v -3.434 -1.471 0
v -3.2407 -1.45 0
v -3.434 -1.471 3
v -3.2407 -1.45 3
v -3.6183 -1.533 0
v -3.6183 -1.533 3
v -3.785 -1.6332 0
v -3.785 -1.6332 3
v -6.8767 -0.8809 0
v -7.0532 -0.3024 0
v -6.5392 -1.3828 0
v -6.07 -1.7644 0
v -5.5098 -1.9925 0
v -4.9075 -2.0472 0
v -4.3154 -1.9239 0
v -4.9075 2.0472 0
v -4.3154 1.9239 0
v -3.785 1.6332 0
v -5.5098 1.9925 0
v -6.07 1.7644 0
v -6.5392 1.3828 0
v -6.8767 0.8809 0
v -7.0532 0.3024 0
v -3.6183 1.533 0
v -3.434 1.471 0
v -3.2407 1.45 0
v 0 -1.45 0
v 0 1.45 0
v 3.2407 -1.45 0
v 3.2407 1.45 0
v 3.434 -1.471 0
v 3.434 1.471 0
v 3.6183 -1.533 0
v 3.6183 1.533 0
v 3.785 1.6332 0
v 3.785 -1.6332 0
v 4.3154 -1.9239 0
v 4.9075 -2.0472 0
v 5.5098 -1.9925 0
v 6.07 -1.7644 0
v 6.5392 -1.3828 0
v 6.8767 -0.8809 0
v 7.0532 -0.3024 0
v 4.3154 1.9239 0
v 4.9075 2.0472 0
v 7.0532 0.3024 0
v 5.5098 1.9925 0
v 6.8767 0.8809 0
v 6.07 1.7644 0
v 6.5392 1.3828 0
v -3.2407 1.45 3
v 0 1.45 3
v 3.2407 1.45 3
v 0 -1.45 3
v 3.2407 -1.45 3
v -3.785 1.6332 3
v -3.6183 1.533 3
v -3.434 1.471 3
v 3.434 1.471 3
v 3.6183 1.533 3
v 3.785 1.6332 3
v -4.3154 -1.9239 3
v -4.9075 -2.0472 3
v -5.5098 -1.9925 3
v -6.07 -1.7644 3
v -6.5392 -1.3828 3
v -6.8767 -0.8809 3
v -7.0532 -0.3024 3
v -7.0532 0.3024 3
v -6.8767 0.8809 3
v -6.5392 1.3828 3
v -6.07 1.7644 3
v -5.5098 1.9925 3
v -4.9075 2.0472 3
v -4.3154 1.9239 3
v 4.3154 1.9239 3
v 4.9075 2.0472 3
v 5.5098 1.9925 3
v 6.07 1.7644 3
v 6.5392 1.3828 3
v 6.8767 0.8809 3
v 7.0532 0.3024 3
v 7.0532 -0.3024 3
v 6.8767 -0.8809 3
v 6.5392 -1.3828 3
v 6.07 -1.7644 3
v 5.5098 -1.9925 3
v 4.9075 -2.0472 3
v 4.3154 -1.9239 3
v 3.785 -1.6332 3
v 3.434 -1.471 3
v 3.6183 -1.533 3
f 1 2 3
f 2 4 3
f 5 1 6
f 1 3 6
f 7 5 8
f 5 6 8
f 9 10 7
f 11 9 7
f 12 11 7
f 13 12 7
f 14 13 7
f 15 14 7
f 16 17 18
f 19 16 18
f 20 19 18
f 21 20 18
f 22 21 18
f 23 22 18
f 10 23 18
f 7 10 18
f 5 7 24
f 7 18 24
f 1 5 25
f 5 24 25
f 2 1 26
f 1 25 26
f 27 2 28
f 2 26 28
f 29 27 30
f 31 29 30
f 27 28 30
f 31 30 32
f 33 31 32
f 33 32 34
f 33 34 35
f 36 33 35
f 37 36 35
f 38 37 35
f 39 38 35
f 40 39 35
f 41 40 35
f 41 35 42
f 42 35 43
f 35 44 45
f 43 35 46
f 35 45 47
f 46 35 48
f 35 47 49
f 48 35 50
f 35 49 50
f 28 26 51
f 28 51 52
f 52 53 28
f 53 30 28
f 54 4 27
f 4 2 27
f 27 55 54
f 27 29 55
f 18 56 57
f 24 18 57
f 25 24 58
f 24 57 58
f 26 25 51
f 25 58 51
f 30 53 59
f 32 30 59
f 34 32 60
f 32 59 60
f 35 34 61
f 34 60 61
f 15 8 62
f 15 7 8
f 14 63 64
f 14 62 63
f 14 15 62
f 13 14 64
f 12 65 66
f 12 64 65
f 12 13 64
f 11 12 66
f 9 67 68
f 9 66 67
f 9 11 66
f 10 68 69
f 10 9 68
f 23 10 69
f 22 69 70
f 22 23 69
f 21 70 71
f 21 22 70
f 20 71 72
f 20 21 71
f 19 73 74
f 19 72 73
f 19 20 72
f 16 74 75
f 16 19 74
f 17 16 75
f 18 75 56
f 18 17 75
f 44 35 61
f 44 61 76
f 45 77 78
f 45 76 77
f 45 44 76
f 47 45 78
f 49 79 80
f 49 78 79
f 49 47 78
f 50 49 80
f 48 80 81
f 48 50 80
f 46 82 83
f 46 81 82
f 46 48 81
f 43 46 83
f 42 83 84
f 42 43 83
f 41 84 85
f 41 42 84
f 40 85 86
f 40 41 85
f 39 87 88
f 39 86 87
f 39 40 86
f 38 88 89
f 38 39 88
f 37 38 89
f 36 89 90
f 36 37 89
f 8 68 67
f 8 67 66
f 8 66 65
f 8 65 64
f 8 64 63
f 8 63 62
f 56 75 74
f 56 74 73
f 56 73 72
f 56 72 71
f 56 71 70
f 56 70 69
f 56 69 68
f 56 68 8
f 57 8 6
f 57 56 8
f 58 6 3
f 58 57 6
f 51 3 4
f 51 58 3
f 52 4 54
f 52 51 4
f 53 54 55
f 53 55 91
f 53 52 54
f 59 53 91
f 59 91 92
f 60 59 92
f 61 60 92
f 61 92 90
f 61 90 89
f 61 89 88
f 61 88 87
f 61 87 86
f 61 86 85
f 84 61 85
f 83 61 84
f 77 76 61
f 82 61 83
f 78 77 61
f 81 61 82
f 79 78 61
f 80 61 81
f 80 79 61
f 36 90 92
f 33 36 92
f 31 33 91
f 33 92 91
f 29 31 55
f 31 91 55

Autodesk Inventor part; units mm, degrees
ref_plane "Plan YZ" through (0, 0, 0) normal (1, 0, 0) x (0, 1, 0)
ref_plane "Plan XZ" through (0, 0, 0) normal (0, 1, 0) x (-1, 0, 0)
ref_plane "Plan XY" through (0, 0, 0) normal (0, 0, 1) x (1, 0, 0)
sketch "Esquisse1" plane through (0, 0, 0) normal (0, 0, 1) x (1, 0, 0)
  arc A0 (-3.575, 1.45) -> (-3.575, -1.45) centre (-5.025, 0) ccw
  line L0 (-5.025, 0) -> (-3.575, -1.45) construction
  line L1 (-5.025, 0) -> (-2.9744, 0) construction
  line L2 (-5.025, 0) -> (-3.575, 1.45) construction
  line L3 (-3.575, 1.45) -> (0, 1.45)
  line L4 (-3.575, -1.45) -> (0, -1.45)
  line L5 (0, -2.8709) -> (0, 2.8709) construction
  arc A1 (3.575, -1.45) -> (3.575, 1.45) centre (5.025, 0) ccw
  line L6 (3.575, 1.45) -> (0, 1.45)
  line L7 (3.575, -1.45) -> (0, -1.45)
  line L8 (-9.9059, 0) -> (9.9059, 0) construction
  point P0 (0, 0)
  dimension "d0" = 45
  dimension "d1" = 90
  dimension "d2" = 2.9
  dimension "d3" = 5.025
extrude "Extrusion1" add sketch "Esquisse1" along normal blind 3
fillet "Congé1" radius 0.9 4 edges at (-3.575, -1.45, 1.5) (3.575, -1.45, 1.5) (3.575, 1.45, 1.5) (-3.575, 1.45, 1.5)
properties part number "T2601_Conn" material "."
